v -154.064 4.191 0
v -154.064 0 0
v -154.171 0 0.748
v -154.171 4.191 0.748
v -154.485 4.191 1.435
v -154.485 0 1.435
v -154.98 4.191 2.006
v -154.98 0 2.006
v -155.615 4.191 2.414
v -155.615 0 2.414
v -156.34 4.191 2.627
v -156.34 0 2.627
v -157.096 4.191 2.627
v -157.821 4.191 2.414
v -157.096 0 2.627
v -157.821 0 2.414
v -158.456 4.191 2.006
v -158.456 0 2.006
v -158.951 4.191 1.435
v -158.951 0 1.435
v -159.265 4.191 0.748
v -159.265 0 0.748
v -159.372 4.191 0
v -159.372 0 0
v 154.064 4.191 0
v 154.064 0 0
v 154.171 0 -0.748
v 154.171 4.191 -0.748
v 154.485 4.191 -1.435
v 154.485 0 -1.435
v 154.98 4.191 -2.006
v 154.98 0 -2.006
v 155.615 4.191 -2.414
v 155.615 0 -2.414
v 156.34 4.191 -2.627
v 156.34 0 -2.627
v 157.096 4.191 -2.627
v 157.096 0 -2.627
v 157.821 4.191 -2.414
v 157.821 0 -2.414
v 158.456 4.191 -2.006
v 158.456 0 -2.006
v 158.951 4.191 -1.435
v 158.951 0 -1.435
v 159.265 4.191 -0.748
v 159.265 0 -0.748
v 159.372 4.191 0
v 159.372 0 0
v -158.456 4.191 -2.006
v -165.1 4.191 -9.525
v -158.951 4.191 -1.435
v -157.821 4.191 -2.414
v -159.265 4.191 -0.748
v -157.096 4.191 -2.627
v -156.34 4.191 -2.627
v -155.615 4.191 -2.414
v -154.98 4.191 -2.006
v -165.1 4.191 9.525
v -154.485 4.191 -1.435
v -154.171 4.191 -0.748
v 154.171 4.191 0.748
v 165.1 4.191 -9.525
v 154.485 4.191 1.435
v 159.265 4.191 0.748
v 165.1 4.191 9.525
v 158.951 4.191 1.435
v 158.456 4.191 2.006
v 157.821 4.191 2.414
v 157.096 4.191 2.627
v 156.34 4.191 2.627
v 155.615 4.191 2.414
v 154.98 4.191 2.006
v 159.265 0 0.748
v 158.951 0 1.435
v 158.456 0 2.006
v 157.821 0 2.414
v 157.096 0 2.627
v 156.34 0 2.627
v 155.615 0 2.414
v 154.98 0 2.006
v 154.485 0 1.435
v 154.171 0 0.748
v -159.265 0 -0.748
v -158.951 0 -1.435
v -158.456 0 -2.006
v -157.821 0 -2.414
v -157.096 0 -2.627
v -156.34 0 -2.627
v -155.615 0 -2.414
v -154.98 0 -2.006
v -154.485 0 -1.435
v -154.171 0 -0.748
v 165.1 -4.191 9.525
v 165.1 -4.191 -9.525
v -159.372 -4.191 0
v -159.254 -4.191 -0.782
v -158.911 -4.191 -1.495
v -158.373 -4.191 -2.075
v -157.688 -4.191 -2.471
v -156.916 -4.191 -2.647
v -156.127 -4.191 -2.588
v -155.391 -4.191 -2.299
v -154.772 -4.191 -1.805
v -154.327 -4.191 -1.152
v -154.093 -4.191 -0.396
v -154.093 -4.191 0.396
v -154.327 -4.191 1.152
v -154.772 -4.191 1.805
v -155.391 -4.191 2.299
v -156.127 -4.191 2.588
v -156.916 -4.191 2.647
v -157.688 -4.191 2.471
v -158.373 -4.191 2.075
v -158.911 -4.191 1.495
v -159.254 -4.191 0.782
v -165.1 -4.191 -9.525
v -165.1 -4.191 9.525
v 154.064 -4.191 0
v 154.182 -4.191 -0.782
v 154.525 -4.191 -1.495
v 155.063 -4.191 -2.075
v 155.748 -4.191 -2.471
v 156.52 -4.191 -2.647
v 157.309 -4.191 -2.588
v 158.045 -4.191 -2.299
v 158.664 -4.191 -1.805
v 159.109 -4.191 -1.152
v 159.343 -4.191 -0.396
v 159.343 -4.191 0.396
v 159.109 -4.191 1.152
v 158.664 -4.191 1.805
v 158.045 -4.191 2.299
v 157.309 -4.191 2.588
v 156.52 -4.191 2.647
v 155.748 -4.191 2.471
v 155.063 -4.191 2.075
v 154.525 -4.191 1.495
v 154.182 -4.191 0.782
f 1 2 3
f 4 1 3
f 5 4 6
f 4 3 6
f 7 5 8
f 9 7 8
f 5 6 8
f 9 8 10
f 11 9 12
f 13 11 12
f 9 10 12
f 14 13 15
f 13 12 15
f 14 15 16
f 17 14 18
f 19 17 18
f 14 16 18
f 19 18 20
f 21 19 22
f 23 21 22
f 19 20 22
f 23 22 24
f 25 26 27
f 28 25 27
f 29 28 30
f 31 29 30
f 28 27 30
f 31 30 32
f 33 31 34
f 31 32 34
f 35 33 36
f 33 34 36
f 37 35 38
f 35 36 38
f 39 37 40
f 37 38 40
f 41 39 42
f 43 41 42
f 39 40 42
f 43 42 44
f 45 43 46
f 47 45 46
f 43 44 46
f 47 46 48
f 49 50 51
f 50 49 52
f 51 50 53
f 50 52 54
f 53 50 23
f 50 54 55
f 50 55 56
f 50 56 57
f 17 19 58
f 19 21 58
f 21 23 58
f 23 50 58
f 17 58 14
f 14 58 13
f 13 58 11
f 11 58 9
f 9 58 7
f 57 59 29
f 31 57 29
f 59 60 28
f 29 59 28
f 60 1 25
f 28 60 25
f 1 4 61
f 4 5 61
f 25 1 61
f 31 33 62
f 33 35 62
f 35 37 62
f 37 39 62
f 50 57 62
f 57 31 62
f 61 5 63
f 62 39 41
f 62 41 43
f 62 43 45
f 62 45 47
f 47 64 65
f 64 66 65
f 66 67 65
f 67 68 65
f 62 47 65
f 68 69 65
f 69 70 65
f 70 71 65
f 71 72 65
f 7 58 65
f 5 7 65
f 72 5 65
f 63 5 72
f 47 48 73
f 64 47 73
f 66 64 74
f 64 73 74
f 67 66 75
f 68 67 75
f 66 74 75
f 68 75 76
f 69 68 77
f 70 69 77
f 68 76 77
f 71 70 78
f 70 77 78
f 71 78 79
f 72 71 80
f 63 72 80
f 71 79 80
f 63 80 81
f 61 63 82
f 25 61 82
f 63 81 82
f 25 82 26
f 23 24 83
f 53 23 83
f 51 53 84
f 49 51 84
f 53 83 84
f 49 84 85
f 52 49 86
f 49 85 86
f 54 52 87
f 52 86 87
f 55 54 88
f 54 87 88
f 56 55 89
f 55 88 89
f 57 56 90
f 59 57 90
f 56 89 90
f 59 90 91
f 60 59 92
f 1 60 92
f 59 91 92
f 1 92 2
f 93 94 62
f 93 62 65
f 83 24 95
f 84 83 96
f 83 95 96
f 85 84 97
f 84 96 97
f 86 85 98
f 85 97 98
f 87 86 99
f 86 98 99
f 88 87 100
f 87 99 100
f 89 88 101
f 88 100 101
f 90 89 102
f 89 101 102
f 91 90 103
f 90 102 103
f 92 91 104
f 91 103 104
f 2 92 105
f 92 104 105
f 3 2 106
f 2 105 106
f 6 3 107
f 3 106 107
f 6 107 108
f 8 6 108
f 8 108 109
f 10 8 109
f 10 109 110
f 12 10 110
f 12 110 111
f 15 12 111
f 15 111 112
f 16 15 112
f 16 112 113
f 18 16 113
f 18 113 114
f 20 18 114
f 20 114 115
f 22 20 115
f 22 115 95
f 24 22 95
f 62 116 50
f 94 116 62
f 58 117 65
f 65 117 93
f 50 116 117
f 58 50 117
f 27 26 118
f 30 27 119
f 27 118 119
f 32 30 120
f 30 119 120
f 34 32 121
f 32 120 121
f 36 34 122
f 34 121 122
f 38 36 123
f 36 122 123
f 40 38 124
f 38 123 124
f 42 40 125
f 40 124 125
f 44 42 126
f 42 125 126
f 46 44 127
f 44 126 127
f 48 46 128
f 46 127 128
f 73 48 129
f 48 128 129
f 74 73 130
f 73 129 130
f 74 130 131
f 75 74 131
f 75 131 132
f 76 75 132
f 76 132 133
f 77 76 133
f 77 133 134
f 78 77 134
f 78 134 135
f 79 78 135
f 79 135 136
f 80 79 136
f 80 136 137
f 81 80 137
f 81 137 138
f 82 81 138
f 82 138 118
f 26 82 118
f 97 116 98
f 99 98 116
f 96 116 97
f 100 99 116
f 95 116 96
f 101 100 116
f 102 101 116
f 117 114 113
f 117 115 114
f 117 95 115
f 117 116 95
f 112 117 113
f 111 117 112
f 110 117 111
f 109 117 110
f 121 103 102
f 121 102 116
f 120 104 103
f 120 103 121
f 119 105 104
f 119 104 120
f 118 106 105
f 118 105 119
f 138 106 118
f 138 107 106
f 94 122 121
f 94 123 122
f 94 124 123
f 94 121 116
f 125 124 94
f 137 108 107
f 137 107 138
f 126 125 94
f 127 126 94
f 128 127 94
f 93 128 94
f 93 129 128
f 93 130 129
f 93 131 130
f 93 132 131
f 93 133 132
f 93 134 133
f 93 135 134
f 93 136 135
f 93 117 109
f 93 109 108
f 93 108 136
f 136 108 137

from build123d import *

# Parameters (mm, degrees)
F0_W     = 330.2
F0_H     = 19.05
F1_DEPTH = 4.191
F2_D     = 5.3086
F2_DEPTH = 4.192
F3_D     = 5.3086


with BuildPart() as f1:
    # F0 (on Front) → F1 (new body, symmetric)
    with BuildSketch(Plane.XZ):
        Rectangle(F0_W, F0_H)
    extrude(amount=F1_DEPTH, both=True)

    # F2 (through all, one way)
    with BuildSketch(Plane.XZ):
        with Locations((-156.718, 0), (156.718, 0)):
            Circle(F2_D / 2)
    extrude(amount=-F2_DEPTH, mode=Mode.SUBTRACT)

    # F3 (through all)
    with Locations(Plane(origin=(0, 0, 0), x_dir=(1, 0, 0), z_dir=(0, 1, 0))):
        with Locations((-156.718, 0), (156.718, 0)):
            Hole(F3_D / 2)


solid = f1.part
